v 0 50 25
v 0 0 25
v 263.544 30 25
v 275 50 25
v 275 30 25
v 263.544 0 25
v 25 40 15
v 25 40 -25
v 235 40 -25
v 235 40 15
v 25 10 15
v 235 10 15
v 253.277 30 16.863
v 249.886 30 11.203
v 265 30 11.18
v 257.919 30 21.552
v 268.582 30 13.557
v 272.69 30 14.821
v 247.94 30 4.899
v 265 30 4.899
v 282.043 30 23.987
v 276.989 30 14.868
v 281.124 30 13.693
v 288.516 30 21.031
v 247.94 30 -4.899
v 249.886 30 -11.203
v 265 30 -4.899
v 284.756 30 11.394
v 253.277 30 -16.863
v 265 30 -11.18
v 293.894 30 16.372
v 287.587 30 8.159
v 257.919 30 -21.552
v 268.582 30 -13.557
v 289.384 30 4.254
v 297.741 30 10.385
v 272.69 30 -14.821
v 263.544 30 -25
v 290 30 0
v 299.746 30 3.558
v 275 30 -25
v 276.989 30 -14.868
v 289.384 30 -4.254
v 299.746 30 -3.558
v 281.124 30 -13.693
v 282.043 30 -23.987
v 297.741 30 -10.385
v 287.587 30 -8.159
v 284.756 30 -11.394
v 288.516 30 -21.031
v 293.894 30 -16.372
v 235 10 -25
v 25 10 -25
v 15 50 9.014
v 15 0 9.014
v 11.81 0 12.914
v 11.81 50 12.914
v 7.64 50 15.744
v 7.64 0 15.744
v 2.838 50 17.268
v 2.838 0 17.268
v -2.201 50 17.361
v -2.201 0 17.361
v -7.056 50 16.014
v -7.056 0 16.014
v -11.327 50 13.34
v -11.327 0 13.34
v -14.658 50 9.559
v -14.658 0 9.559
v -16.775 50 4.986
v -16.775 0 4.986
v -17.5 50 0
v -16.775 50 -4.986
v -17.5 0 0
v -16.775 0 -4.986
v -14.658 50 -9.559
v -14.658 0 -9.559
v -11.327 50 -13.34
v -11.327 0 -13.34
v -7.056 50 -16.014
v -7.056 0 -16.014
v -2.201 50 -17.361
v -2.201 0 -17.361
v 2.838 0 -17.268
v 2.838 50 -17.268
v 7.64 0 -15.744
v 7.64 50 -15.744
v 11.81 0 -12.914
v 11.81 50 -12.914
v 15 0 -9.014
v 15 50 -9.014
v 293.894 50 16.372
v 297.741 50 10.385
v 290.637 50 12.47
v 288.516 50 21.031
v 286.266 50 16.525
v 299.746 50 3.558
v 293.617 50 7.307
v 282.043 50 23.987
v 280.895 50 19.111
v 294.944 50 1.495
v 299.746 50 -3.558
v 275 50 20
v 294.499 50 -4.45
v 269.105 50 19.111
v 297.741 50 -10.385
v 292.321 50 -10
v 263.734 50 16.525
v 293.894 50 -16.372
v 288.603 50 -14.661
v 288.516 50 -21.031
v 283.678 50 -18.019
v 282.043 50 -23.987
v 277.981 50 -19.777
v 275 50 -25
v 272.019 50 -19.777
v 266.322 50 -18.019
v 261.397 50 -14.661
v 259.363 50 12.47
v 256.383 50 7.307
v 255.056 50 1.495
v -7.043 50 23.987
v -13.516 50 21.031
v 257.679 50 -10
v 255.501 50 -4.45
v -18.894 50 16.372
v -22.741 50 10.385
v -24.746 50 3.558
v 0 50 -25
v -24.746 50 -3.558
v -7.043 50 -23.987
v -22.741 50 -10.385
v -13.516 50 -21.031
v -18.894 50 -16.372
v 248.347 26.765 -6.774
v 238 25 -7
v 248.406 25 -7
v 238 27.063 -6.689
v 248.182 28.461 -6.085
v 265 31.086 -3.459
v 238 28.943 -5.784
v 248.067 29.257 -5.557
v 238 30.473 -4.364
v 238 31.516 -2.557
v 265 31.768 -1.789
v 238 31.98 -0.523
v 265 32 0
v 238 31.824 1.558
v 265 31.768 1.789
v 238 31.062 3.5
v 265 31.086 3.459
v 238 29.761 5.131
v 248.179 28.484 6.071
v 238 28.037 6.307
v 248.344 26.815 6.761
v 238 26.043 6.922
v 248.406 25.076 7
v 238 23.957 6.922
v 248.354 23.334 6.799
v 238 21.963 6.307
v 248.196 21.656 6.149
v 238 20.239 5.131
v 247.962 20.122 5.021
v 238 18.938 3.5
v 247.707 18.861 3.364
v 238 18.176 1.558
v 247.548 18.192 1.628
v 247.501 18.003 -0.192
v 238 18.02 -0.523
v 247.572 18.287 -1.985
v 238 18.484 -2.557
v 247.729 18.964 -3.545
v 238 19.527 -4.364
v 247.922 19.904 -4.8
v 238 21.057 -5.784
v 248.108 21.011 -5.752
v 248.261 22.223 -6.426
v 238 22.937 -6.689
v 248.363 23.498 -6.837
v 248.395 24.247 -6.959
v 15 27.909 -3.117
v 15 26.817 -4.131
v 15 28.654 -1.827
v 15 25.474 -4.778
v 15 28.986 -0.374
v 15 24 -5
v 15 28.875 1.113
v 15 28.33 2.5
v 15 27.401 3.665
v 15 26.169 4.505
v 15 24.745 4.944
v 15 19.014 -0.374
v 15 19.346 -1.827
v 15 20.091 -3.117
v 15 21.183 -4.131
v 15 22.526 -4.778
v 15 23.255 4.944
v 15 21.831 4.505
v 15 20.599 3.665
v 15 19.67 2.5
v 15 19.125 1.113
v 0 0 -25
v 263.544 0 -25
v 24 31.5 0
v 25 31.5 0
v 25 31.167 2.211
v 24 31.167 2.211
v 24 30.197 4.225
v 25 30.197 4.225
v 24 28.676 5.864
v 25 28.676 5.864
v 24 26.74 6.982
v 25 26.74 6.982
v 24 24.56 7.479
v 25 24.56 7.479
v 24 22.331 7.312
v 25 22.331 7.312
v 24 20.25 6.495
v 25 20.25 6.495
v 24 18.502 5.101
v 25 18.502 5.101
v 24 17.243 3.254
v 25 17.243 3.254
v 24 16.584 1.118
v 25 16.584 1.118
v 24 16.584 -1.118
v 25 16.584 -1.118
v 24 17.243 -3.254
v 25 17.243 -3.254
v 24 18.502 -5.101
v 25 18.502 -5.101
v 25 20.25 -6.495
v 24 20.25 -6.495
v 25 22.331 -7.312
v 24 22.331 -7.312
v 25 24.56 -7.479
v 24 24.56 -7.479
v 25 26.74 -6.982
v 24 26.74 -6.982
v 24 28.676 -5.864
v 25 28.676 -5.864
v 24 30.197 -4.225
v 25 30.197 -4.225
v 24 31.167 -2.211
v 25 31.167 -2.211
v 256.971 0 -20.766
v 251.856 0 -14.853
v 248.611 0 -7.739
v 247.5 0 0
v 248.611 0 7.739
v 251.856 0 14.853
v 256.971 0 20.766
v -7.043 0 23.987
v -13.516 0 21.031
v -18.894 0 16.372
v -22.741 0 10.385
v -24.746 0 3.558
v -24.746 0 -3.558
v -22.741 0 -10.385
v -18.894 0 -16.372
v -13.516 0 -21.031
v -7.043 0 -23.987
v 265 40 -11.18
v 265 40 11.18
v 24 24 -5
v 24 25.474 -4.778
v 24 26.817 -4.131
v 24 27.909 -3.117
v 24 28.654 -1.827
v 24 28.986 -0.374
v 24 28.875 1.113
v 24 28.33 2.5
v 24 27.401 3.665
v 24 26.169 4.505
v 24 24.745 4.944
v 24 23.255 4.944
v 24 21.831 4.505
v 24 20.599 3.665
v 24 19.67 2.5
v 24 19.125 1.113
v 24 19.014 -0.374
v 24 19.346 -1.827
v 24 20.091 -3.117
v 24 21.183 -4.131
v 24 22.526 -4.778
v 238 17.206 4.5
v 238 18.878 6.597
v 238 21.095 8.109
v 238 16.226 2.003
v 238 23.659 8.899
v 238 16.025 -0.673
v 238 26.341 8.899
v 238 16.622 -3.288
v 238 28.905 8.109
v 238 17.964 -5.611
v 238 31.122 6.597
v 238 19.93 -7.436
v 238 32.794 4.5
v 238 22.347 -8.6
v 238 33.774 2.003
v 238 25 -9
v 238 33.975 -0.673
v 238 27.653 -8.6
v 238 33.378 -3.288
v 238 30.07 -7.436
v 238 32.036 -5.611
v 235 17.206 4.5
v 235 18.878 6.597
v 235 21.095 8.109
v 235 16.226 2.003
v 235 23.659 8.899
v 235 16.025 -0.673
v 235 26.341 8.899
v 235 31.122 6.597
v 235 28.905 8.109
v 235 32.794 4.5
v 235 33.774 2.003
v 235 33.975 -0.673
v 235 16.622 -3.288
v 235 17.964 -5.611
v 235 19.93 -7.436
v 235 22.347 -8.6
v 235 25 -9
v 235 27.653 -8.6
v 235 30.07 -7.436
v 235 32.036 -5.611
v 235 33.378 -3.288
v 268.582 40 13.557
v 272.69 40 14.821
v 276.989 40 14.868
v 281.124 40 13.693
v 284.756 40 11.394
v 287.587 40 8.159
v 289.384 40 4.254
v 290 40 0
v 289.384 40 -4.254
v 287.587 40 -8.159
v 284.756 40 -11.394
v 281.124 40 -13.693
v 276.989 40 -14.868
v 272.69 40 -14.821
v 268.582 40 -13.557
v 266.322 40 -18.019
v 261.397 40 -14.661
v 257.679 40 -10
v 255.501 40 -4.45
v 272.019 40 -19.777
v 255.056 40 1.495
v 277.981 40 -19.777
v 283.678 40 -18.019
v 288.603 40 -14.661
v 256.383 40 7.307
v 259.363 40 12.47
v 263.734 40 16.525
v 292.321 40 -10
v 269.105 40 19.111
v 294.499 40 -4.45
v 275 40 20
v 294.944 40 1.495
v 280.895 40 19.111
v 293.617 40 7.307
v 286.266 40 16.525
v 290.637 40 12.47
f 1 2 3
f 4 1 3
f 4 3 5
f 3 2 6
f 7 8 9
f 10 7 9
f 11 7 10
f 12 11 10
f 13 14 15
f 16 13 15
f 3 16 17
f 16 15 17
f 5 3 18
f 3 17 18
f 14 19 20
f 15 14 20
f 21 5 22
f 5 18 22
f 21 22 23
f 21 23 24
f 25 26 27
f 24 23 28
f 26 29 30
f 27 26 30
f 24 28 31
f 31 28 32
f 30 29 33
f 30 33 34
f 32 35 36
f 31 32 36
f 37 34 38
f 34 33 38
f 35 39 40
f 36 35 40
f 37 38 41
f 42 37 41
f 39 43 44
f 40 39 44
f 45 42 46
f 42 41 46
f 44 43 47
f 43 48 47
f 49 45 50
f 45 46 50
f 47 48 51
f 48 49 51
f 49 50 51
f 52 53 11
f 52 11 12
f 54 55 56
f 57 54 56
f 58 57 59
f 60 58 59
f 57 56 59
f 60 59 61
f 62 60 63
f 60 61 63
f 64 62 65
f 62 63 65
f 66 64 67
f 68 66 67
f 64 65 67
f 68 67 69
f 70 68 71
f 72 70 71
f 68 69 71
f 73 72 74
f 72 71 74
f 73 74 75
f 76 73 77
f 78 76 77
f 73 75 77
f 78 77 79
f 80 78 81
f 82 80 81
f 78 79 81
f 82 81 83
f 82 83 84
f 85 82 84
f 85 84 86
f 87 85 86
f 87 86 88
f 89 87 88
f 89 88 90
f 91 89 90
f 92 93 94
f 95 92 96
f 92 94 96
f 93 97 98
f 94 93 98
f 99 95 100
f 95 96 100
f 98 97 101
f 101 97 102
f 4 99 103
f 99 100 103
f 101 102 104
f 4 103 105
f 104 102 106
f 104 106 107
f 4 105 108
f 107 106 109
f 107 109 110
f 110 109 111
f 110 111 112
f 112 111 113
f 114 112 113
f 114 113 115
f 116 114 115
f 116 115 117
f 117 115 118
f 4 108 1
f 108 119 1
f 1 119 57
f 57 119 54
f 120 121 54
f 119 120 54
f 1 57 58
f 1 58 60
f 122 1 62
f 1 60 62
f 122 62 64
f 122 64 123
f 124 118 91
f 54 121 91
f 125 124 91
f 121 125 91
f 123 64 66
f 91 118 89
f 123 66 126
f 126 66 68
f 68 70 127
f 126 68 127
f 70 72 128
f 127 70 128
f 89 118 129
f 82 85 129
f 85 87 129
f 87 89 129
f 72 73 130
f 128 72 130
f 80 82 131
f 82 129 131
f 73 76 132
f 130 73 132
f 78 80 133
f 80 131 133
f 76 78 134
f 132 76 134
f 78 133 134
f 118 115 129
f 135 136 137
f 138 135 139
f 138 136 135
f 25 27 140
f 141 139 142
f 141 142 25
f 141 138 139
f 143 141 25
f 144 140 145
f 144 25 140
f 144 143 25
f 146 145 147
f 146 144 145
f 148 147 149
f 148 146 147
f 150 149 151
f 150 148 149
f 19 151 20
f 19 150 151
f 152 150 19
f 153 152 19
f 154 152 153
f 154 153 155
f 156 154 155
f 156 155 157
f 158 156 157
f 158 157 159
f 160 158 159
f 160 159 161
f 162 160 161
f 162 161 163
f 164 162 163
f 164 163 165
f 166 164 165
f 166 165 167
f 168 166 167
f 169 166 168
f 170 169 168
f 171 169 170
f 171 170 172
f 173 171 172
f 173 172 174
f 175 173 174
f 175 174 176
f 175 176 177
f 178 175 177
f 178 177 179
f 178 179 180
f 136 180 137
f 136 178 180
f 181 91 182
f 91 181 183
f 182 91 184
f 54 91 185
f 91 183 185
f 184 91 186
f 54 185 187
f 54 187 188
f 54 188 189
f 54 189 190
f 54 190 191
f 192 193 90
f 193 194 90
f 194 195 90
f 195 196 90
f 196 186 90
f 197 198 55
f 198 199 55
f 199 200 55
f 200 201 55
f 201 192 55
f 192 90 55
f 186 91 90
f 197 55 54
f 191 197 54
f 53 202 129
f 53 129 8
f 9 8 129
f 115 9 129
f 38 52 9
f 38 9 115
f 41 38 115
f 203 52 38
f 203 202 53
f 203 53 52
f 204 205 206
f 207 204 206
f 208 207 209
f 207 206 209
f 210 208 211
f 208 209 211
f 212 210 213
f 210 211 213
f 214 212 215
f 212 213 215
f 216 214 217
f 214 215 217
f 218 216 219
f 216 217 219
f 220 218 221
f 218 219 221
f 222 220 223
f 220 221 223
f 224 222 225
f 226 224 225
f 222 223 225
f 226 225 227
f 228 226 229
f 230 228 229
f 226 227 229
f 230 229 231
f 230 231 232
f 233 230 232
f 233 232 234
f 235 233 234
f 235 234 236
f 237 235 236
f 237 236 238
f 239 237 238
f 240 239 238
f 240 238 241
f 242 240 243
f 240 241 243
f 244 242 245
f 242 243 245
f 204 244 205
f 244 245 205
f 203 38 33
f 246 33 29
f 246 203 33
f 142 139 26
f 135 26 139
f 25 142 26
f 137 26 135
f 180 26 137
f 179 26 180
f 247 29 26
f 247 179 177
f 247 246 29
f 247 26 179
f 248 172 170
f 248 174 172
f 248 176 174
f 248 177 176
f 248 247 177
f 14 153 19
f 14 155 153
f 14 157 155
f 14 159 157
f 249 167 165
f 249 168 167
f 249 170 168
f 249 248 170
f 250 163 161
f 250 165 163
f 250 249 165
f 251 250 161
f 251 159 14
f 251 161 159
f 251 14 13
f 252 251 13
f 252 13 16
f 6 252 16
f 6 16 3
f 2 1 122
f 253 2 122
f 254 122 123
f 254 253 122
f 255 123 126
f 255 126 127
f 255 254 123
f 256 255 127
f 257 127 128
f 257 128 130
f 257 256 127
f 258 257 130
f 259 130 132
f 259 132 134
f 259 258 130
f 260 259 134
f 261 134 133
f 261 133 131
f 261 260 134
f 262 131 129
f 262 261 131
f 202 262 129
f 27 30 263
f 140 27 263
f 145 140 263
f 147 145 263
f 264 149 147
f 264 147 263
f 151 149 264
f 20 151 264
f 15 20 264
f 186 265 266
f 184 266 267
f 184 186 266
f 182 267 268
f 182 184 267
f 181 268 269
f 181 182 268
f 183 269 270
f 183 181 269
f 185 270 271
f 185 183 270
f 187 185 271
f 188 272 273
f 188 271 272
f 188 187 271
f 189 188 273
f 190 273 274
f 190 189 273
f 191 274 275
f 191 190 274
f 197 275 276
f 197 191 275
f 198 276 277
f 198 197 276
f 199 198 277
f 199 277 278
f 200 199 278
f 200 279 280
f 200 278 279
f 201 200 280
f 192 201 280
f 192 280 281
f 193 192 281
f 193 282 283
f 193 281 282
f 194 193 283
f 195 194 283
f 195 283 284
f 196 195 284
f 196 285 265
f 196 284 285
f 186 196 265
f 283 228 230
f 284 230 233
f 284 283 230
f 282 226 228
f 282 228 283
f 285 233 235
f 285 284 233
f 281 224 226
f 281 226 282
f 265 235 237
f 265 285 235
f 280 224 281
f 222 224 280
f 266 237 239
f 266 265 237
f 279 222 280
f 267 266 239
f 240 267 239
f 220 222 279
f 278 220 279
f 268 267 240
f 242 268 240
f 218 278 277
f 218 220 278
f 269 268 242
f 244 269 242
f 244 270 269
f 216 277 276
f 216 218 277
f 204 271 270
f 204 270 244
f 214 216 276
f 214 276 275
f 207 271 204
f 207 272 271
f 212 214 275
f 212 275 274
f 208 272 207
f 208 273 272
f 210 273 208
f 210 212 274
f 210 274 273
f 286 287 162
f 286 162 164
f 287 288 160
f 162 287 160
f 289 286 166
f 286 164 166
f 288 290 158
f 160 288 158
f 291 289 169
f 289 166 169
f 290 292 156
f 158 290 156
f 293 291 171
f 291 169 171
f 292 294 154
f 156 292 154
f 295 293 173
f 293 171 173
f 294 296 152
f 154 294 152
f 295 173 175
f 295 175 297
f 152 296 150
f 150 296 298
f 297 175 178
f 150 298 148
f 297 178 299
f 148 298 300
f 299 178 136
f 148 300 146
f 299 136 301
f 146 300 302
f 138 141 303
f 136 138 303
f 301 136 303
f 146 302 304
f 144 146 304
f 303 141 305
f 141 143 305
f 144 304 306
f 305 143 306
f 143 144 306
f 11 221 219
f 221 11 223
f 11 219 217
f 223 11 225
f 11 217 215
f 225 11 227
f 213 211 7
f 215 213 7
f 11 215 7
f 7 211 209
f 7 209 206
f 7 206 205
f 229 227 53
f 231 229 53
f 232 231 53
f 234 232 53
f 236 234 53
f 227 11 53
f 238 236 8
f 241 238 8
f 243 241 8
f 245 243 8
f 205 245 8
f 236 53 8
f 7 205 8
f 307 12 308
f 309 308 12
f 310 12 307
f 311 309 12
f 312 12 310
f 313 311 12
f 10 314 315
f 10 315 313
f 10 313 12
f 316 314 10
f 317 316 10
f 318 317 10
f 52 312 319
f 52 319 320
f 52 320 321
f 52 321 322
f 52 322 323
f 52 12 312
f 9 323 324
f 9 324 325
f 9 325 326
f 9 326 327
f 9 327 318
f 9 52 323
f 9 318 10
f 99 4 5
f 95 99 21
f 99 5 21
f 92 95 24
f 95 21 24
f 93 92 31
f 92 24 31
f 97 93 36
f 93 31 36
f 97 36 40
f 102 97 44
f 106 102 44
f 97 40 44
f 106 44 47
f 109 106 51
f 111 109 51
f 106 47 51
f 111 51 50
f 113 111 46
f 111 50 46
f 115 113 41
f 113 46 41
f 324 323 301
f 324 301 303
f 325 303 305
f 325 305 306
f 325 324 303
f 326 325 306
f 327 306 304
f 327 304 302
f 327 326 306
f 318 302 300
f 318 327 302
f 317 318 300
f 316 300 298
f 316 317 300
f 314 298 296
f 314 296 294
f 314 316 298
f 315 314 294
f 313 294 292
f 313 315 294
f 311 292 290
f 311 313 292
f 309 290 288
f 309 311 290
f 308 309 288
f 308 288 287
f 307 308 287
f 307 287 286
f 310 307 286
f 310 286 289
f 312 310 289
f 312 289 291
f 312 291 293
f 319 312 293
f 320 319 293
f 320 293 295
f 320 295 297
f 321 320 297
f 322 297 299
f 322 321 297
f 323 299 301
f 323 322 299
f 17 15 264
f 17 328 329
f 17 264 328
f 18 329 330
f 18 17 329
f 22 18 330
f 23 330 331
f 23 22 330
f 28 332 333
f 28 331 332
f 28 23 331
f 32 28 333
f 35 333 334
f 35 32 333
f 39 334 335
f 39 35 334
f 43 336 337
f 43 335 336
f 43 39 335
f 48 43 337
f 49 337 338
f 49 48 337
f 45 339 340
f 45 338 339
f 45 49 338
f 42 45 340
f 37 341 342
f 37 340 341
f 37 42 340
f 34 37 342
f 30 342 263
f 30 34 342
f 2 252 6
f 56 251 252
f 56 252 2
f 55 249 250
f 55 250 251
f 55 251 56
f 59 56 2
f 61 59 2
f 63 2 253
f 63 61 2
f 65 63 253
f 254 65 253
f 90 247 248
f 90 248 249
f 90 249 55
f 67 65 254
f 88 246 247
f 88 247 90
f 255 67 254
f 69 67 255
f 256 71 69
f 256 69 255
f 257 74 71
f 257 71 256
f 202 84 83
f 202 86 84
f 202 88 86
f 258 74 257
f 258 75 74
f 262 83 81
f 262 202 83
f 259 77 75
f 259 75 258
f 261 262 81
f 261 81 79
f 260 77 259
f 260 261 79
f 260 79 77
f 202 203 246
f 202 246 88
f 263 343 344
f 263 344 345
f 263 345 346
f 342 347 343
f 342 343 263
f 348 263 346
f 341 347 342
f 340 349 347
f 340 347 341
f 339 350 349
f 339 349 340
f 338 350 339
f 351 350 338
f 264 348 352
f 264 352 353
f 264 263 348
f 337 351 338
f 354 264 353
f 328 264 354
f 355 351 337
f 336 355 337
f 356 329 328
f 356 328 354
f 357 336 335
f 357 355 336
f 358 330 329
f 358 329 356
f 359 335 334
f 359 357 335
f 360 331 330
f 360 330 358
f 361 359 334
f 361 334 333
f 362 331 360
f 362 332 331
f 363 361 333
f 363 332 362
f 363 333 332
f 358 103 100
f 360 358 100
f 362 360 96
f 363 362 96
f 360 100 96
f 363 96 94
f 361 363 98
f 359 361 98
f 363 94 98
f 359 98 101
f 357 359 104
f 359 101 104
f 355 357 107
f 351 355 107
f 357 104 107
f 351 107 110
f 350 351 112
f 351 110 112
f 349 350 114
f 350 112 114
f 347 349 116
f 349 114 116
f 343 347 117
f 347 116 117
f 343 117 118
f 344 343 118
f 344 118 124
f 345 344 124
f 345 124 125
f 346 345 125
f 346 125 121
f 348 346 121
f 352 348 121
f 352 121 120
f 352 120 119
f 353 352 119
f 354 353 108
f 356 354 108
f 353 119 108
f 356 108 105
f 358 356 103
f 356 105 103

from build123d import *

# Parameters (mm, degrees)
RECTWITHARC_W              = 275
RECTWITHARC_H              = 50
ARMBASE_DEPTH              = 50
CUT_EXTRUDE1_REACH         = 307.164
HOLLOWMIDDLE_DEPTH         = 15
HOLLOWMIDDLE_DEPTH_BACK    = 306.163890393
SKETCH1_W                  = 210
SKETCH1_H                  = 30
JOINT2SHAFTHOLE_DEPTH      = 306.163890393
JOINT2SHAFTHOLE_DEPTH_BACK = 10
J2SHAFTCOUNTERSINK_START   = 50
SKETCH4_R                  = 20
J2SHAFTCOUNTERSINK_DEPTH   = 10
HOLDINGHOLE_START          = 15
HOLDINGHOLE_OUTLINE_R      = 5
HOLDINGHOLE_DEPTH          = 10
COUNTERSINK_R              = 7.5
COUNTERSINKCUT_DEPTH       = 1
MOUNTING_START             = 235
SKETCH6_R                  = 7
MOUNTING_HOLE_DEPTH        = 30
COUNTERSINK2_START         = 235
SKETCH7_R                  = 9
COUNTERSINK2_DEPTH         = 3
SKETCH8_R                  = 27.5
ARMCUTOUT_DEPTH            = 30


# Read off the part's stored shape, not the designer's step: HoldingHole
with BuildPart() as part:
    # RectwithArc → ArmBase (new body)
    with BuildSketch(Plane(origin=(0, 0, 0), x_dir=(1, 0, 0), z_dir=(0, 1, 0))):
        with BuildLine():
            ThreePointArc((0, -25), (-25, 0), (0, 25))
            Line((0, 25), (0, -25))
        make_face()
        with Locations((137.5, 0)):
            Rectangle(RECTWITHARC_W, RECTWITHARC_H)
        with BuildLine():
            Line((275, 25), (275, -25))
            ThreePointArc((275, -25), (300, 0), (275, 25))
        make_face()
    extrude(amount=ARMBASE_DEPTH)

    # ShaftKey → Cut-Extrude1 (cut, up to next)
    with BuildSketch(Plane(origin=(0, 0, 0), x_dir=(1, 0, 0), z_dir=(0, 1, 0)), mode=Mode.PRIVATE) as cut_extrude1_sk1:
        with BuildLine():
            Line((15, 9.013878189), (15, -9.013878189))
            ThreePointArc((15, -9.013878189), (-17.5, 0), (15, 9.013878189))
        make_face()
    cut_extrude1_tool1 = extrude(cut_extrude1_sk1.sketch, amount=CUT_EXTRUDE1_REACH, mode=Mode.PRIVATE) & part.part
    add(cut_extrude1_tool1.solids().sort_by_distance((-0.524095, 0, 0))[0], mode=Mode.SUBTRACT)

    # Sketch1 → HollowMIddle (cut, two sides: drawn at the far end of the back side and taken through both)
    with BuildSketch(Plane.XY.offset(-HOLLOWMIDDLE_DEPTH_BACK)):
        with Locations((130, 25)):
            Rectangle(SKETCH1_W, SKETCH1_H)
    extrude(amount=HOLLOWMIDDLE_DEPTH + HOLLOWMIDDLE_DEPTH_BACK, mode=Mode.SUBTRACT)

    # J2ShaftHole → Joint2ShaftHole (cut, two sides: drawn at the far end of the back side and taken through both)
    with BuildSketch(Plane(origin=(0, 0, 0), x_dir=(1, 0, 0), z_dir=(0, 1, 0)).offset(-JOINT2SHAFTHOLE_DEPTH_BACK)):
        with BuildLine():
            Line((265, 11.180339887), (265, -11.180339887))
            ThreePointArc((265, -11.180339887), (290, 0), (265, 11.180339887))
        make_face()
    extrude(amount=JOINT2SHAFTHOLE_DEPTH + JOINT2SHAFTHOLE_DEPTH_BACK, mode=Mode.SUBTRACT)

    # Sketch4 → J2ShaftCounterSink (cut)
    with BuildSketch(Plane(origin=(0, 0, 0), x_dir=(1, 0, 0), z_dir=(0, 1, 0)).offset(J2SHAFTCOUNTERSINK_START)):
        with Locations(Location((275, 0, 0), (0, 0, 270))):
            Circle(SKETCH4_R)
    extrude(amount=-J2SHAFTCOUNTERSINK_DEPTH, mode=Mode.SUBTRACT)

    # HoldingHole outline → HoldingHole (cut)
    with BuildSketch(Plane(origin=(0, 0, 0), x_dir=(0, 0, -1), z_dir=(1, 0, 0)).offset(HOLDINGHOLE_START)):
        with Locations((0, 24)):
            Circle(HOLDINGHOLE_OUTLINE_R)
    extrude(amount=HOLDINGHOLE_DEPTH, mode=Mode.SUBTRACT)

    # CounterSink → CounterSinkCut (cut)
    with BuildSketch(Plane(origin=(25, 0, 0), x_dir=(0, 0, -1), z_dir=(1, 0, 0))):
        with Locations(Location((0, 24, 0), (0, 0, 90))):
            Circle(COUNTERSINK_R)
    extrude(amount=-COUNTERSINKCUT_DEPTH, mode=Mode.SUBTRACT)

    # Sketch6 → Mounting Hole (cut)
    with BuildSketch(Plane(origin=(0, 0, 0), x_dir=(0, 0, -1), z_dir=(1, 0, 0)).offset(MOUNTING_START)):
        with Locations((0, 25)):
            Circle(SKETCH6_R)
    extrude(amount=MOUNTING_HOLE_DEPTH, mode=Mode.SUBTRACT)

    # Sketch7 → CounterSink2 (cut)
    with BuildSketch(Plane(origin=(0, 0, 0), x_dir=(0, 0, -1), z_dir=(1, 0, 0)).offset(COUNTERSINK2_START)):
        with Locations((0, 25)):
            Circle(SKETCH7_R)
    extrude(amount=COUNTERSINK2_DEPTH, mode=Mode.SUBTRACT)

    # Sketch8 → ArmCutout (cut)
    with BuildSketch(Plane(origin=(0, 0, 0), x_dir=(1, 0, 0), z_dir=(0, 1, 0))):
        with Locations((275, 0)):
            Circle(SKETCH8_R)
    extrude(amount=ARMCUTOUT_DEPTH, mode=Mode.SUBTRACT)


solid = part.part
